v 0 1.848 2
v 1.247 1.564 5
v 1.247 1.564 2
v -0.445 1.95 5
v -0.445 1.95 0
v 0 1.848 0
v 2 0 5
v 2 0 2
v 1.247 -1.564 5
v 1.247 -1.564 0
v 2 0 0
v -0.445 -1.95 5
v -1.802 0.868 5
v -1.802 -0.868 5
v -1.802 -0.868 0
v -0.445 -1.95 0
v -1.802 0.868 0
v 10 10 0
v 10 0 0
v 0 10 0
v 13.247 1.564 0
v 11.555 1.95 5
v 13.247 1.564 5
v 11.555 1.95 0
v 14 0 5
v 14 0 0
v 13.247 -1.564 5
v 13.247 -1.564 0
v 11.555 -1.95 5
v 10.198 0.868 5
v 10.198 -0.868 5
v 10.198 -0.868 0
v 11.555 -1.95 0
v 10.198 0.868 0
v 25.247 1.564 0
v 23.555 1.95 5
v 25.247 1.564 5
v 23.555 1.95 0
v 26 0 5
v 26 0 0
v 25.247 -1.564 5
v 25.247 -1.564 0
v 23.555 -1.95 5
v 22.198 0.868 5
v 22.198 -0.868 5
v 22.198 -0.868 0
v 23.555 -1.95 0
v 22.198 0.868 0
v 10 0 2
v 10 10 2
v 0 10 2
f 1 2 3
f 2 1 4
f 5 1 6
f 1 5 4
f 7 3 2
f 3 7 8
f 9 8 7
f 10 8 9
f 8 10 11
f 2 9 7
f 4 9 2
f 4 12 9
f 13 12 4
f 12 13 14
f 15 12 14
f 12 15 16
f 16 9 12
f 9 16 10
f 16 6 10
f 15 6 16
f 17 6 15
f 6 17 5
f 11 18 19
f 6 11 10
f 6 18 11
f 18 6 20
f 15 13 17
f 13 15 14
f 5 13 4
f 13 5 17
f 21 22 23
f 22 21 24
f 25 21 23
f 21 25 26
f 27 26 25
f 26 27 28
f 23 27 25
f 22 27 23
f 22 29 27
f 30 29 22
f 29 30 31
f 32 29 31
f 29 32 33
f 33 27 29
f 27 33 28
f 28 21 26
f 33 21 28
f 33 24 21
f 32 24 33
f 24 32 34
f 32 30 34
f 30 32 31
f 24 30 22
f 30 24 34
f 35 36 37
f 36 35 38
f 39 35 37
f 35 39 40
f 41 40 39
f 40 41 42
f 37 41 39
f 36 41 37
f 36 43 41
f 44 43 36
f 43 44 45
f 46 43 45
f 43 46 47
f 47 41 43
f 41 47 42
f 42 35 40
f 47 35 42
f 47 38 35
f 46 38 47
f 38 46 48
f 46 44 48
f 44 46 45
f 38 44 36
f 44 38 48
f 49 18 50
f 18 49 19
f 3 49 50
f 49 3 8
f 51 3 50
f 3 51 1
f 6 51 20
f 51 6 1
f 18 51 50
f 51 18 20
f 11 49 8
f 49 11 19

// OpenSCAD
// Variables, for-loops, and modules
size = 10;
spacing = 12;

module peg(h = 5, r = 2) {
    cylinder(h = h, r = r);
}

for (i = [0 : 2]) {
    translate([i * spacing, 0, 0])
        peg(h = size / 2, r = 2);
}

cube([size, size, 2]);
